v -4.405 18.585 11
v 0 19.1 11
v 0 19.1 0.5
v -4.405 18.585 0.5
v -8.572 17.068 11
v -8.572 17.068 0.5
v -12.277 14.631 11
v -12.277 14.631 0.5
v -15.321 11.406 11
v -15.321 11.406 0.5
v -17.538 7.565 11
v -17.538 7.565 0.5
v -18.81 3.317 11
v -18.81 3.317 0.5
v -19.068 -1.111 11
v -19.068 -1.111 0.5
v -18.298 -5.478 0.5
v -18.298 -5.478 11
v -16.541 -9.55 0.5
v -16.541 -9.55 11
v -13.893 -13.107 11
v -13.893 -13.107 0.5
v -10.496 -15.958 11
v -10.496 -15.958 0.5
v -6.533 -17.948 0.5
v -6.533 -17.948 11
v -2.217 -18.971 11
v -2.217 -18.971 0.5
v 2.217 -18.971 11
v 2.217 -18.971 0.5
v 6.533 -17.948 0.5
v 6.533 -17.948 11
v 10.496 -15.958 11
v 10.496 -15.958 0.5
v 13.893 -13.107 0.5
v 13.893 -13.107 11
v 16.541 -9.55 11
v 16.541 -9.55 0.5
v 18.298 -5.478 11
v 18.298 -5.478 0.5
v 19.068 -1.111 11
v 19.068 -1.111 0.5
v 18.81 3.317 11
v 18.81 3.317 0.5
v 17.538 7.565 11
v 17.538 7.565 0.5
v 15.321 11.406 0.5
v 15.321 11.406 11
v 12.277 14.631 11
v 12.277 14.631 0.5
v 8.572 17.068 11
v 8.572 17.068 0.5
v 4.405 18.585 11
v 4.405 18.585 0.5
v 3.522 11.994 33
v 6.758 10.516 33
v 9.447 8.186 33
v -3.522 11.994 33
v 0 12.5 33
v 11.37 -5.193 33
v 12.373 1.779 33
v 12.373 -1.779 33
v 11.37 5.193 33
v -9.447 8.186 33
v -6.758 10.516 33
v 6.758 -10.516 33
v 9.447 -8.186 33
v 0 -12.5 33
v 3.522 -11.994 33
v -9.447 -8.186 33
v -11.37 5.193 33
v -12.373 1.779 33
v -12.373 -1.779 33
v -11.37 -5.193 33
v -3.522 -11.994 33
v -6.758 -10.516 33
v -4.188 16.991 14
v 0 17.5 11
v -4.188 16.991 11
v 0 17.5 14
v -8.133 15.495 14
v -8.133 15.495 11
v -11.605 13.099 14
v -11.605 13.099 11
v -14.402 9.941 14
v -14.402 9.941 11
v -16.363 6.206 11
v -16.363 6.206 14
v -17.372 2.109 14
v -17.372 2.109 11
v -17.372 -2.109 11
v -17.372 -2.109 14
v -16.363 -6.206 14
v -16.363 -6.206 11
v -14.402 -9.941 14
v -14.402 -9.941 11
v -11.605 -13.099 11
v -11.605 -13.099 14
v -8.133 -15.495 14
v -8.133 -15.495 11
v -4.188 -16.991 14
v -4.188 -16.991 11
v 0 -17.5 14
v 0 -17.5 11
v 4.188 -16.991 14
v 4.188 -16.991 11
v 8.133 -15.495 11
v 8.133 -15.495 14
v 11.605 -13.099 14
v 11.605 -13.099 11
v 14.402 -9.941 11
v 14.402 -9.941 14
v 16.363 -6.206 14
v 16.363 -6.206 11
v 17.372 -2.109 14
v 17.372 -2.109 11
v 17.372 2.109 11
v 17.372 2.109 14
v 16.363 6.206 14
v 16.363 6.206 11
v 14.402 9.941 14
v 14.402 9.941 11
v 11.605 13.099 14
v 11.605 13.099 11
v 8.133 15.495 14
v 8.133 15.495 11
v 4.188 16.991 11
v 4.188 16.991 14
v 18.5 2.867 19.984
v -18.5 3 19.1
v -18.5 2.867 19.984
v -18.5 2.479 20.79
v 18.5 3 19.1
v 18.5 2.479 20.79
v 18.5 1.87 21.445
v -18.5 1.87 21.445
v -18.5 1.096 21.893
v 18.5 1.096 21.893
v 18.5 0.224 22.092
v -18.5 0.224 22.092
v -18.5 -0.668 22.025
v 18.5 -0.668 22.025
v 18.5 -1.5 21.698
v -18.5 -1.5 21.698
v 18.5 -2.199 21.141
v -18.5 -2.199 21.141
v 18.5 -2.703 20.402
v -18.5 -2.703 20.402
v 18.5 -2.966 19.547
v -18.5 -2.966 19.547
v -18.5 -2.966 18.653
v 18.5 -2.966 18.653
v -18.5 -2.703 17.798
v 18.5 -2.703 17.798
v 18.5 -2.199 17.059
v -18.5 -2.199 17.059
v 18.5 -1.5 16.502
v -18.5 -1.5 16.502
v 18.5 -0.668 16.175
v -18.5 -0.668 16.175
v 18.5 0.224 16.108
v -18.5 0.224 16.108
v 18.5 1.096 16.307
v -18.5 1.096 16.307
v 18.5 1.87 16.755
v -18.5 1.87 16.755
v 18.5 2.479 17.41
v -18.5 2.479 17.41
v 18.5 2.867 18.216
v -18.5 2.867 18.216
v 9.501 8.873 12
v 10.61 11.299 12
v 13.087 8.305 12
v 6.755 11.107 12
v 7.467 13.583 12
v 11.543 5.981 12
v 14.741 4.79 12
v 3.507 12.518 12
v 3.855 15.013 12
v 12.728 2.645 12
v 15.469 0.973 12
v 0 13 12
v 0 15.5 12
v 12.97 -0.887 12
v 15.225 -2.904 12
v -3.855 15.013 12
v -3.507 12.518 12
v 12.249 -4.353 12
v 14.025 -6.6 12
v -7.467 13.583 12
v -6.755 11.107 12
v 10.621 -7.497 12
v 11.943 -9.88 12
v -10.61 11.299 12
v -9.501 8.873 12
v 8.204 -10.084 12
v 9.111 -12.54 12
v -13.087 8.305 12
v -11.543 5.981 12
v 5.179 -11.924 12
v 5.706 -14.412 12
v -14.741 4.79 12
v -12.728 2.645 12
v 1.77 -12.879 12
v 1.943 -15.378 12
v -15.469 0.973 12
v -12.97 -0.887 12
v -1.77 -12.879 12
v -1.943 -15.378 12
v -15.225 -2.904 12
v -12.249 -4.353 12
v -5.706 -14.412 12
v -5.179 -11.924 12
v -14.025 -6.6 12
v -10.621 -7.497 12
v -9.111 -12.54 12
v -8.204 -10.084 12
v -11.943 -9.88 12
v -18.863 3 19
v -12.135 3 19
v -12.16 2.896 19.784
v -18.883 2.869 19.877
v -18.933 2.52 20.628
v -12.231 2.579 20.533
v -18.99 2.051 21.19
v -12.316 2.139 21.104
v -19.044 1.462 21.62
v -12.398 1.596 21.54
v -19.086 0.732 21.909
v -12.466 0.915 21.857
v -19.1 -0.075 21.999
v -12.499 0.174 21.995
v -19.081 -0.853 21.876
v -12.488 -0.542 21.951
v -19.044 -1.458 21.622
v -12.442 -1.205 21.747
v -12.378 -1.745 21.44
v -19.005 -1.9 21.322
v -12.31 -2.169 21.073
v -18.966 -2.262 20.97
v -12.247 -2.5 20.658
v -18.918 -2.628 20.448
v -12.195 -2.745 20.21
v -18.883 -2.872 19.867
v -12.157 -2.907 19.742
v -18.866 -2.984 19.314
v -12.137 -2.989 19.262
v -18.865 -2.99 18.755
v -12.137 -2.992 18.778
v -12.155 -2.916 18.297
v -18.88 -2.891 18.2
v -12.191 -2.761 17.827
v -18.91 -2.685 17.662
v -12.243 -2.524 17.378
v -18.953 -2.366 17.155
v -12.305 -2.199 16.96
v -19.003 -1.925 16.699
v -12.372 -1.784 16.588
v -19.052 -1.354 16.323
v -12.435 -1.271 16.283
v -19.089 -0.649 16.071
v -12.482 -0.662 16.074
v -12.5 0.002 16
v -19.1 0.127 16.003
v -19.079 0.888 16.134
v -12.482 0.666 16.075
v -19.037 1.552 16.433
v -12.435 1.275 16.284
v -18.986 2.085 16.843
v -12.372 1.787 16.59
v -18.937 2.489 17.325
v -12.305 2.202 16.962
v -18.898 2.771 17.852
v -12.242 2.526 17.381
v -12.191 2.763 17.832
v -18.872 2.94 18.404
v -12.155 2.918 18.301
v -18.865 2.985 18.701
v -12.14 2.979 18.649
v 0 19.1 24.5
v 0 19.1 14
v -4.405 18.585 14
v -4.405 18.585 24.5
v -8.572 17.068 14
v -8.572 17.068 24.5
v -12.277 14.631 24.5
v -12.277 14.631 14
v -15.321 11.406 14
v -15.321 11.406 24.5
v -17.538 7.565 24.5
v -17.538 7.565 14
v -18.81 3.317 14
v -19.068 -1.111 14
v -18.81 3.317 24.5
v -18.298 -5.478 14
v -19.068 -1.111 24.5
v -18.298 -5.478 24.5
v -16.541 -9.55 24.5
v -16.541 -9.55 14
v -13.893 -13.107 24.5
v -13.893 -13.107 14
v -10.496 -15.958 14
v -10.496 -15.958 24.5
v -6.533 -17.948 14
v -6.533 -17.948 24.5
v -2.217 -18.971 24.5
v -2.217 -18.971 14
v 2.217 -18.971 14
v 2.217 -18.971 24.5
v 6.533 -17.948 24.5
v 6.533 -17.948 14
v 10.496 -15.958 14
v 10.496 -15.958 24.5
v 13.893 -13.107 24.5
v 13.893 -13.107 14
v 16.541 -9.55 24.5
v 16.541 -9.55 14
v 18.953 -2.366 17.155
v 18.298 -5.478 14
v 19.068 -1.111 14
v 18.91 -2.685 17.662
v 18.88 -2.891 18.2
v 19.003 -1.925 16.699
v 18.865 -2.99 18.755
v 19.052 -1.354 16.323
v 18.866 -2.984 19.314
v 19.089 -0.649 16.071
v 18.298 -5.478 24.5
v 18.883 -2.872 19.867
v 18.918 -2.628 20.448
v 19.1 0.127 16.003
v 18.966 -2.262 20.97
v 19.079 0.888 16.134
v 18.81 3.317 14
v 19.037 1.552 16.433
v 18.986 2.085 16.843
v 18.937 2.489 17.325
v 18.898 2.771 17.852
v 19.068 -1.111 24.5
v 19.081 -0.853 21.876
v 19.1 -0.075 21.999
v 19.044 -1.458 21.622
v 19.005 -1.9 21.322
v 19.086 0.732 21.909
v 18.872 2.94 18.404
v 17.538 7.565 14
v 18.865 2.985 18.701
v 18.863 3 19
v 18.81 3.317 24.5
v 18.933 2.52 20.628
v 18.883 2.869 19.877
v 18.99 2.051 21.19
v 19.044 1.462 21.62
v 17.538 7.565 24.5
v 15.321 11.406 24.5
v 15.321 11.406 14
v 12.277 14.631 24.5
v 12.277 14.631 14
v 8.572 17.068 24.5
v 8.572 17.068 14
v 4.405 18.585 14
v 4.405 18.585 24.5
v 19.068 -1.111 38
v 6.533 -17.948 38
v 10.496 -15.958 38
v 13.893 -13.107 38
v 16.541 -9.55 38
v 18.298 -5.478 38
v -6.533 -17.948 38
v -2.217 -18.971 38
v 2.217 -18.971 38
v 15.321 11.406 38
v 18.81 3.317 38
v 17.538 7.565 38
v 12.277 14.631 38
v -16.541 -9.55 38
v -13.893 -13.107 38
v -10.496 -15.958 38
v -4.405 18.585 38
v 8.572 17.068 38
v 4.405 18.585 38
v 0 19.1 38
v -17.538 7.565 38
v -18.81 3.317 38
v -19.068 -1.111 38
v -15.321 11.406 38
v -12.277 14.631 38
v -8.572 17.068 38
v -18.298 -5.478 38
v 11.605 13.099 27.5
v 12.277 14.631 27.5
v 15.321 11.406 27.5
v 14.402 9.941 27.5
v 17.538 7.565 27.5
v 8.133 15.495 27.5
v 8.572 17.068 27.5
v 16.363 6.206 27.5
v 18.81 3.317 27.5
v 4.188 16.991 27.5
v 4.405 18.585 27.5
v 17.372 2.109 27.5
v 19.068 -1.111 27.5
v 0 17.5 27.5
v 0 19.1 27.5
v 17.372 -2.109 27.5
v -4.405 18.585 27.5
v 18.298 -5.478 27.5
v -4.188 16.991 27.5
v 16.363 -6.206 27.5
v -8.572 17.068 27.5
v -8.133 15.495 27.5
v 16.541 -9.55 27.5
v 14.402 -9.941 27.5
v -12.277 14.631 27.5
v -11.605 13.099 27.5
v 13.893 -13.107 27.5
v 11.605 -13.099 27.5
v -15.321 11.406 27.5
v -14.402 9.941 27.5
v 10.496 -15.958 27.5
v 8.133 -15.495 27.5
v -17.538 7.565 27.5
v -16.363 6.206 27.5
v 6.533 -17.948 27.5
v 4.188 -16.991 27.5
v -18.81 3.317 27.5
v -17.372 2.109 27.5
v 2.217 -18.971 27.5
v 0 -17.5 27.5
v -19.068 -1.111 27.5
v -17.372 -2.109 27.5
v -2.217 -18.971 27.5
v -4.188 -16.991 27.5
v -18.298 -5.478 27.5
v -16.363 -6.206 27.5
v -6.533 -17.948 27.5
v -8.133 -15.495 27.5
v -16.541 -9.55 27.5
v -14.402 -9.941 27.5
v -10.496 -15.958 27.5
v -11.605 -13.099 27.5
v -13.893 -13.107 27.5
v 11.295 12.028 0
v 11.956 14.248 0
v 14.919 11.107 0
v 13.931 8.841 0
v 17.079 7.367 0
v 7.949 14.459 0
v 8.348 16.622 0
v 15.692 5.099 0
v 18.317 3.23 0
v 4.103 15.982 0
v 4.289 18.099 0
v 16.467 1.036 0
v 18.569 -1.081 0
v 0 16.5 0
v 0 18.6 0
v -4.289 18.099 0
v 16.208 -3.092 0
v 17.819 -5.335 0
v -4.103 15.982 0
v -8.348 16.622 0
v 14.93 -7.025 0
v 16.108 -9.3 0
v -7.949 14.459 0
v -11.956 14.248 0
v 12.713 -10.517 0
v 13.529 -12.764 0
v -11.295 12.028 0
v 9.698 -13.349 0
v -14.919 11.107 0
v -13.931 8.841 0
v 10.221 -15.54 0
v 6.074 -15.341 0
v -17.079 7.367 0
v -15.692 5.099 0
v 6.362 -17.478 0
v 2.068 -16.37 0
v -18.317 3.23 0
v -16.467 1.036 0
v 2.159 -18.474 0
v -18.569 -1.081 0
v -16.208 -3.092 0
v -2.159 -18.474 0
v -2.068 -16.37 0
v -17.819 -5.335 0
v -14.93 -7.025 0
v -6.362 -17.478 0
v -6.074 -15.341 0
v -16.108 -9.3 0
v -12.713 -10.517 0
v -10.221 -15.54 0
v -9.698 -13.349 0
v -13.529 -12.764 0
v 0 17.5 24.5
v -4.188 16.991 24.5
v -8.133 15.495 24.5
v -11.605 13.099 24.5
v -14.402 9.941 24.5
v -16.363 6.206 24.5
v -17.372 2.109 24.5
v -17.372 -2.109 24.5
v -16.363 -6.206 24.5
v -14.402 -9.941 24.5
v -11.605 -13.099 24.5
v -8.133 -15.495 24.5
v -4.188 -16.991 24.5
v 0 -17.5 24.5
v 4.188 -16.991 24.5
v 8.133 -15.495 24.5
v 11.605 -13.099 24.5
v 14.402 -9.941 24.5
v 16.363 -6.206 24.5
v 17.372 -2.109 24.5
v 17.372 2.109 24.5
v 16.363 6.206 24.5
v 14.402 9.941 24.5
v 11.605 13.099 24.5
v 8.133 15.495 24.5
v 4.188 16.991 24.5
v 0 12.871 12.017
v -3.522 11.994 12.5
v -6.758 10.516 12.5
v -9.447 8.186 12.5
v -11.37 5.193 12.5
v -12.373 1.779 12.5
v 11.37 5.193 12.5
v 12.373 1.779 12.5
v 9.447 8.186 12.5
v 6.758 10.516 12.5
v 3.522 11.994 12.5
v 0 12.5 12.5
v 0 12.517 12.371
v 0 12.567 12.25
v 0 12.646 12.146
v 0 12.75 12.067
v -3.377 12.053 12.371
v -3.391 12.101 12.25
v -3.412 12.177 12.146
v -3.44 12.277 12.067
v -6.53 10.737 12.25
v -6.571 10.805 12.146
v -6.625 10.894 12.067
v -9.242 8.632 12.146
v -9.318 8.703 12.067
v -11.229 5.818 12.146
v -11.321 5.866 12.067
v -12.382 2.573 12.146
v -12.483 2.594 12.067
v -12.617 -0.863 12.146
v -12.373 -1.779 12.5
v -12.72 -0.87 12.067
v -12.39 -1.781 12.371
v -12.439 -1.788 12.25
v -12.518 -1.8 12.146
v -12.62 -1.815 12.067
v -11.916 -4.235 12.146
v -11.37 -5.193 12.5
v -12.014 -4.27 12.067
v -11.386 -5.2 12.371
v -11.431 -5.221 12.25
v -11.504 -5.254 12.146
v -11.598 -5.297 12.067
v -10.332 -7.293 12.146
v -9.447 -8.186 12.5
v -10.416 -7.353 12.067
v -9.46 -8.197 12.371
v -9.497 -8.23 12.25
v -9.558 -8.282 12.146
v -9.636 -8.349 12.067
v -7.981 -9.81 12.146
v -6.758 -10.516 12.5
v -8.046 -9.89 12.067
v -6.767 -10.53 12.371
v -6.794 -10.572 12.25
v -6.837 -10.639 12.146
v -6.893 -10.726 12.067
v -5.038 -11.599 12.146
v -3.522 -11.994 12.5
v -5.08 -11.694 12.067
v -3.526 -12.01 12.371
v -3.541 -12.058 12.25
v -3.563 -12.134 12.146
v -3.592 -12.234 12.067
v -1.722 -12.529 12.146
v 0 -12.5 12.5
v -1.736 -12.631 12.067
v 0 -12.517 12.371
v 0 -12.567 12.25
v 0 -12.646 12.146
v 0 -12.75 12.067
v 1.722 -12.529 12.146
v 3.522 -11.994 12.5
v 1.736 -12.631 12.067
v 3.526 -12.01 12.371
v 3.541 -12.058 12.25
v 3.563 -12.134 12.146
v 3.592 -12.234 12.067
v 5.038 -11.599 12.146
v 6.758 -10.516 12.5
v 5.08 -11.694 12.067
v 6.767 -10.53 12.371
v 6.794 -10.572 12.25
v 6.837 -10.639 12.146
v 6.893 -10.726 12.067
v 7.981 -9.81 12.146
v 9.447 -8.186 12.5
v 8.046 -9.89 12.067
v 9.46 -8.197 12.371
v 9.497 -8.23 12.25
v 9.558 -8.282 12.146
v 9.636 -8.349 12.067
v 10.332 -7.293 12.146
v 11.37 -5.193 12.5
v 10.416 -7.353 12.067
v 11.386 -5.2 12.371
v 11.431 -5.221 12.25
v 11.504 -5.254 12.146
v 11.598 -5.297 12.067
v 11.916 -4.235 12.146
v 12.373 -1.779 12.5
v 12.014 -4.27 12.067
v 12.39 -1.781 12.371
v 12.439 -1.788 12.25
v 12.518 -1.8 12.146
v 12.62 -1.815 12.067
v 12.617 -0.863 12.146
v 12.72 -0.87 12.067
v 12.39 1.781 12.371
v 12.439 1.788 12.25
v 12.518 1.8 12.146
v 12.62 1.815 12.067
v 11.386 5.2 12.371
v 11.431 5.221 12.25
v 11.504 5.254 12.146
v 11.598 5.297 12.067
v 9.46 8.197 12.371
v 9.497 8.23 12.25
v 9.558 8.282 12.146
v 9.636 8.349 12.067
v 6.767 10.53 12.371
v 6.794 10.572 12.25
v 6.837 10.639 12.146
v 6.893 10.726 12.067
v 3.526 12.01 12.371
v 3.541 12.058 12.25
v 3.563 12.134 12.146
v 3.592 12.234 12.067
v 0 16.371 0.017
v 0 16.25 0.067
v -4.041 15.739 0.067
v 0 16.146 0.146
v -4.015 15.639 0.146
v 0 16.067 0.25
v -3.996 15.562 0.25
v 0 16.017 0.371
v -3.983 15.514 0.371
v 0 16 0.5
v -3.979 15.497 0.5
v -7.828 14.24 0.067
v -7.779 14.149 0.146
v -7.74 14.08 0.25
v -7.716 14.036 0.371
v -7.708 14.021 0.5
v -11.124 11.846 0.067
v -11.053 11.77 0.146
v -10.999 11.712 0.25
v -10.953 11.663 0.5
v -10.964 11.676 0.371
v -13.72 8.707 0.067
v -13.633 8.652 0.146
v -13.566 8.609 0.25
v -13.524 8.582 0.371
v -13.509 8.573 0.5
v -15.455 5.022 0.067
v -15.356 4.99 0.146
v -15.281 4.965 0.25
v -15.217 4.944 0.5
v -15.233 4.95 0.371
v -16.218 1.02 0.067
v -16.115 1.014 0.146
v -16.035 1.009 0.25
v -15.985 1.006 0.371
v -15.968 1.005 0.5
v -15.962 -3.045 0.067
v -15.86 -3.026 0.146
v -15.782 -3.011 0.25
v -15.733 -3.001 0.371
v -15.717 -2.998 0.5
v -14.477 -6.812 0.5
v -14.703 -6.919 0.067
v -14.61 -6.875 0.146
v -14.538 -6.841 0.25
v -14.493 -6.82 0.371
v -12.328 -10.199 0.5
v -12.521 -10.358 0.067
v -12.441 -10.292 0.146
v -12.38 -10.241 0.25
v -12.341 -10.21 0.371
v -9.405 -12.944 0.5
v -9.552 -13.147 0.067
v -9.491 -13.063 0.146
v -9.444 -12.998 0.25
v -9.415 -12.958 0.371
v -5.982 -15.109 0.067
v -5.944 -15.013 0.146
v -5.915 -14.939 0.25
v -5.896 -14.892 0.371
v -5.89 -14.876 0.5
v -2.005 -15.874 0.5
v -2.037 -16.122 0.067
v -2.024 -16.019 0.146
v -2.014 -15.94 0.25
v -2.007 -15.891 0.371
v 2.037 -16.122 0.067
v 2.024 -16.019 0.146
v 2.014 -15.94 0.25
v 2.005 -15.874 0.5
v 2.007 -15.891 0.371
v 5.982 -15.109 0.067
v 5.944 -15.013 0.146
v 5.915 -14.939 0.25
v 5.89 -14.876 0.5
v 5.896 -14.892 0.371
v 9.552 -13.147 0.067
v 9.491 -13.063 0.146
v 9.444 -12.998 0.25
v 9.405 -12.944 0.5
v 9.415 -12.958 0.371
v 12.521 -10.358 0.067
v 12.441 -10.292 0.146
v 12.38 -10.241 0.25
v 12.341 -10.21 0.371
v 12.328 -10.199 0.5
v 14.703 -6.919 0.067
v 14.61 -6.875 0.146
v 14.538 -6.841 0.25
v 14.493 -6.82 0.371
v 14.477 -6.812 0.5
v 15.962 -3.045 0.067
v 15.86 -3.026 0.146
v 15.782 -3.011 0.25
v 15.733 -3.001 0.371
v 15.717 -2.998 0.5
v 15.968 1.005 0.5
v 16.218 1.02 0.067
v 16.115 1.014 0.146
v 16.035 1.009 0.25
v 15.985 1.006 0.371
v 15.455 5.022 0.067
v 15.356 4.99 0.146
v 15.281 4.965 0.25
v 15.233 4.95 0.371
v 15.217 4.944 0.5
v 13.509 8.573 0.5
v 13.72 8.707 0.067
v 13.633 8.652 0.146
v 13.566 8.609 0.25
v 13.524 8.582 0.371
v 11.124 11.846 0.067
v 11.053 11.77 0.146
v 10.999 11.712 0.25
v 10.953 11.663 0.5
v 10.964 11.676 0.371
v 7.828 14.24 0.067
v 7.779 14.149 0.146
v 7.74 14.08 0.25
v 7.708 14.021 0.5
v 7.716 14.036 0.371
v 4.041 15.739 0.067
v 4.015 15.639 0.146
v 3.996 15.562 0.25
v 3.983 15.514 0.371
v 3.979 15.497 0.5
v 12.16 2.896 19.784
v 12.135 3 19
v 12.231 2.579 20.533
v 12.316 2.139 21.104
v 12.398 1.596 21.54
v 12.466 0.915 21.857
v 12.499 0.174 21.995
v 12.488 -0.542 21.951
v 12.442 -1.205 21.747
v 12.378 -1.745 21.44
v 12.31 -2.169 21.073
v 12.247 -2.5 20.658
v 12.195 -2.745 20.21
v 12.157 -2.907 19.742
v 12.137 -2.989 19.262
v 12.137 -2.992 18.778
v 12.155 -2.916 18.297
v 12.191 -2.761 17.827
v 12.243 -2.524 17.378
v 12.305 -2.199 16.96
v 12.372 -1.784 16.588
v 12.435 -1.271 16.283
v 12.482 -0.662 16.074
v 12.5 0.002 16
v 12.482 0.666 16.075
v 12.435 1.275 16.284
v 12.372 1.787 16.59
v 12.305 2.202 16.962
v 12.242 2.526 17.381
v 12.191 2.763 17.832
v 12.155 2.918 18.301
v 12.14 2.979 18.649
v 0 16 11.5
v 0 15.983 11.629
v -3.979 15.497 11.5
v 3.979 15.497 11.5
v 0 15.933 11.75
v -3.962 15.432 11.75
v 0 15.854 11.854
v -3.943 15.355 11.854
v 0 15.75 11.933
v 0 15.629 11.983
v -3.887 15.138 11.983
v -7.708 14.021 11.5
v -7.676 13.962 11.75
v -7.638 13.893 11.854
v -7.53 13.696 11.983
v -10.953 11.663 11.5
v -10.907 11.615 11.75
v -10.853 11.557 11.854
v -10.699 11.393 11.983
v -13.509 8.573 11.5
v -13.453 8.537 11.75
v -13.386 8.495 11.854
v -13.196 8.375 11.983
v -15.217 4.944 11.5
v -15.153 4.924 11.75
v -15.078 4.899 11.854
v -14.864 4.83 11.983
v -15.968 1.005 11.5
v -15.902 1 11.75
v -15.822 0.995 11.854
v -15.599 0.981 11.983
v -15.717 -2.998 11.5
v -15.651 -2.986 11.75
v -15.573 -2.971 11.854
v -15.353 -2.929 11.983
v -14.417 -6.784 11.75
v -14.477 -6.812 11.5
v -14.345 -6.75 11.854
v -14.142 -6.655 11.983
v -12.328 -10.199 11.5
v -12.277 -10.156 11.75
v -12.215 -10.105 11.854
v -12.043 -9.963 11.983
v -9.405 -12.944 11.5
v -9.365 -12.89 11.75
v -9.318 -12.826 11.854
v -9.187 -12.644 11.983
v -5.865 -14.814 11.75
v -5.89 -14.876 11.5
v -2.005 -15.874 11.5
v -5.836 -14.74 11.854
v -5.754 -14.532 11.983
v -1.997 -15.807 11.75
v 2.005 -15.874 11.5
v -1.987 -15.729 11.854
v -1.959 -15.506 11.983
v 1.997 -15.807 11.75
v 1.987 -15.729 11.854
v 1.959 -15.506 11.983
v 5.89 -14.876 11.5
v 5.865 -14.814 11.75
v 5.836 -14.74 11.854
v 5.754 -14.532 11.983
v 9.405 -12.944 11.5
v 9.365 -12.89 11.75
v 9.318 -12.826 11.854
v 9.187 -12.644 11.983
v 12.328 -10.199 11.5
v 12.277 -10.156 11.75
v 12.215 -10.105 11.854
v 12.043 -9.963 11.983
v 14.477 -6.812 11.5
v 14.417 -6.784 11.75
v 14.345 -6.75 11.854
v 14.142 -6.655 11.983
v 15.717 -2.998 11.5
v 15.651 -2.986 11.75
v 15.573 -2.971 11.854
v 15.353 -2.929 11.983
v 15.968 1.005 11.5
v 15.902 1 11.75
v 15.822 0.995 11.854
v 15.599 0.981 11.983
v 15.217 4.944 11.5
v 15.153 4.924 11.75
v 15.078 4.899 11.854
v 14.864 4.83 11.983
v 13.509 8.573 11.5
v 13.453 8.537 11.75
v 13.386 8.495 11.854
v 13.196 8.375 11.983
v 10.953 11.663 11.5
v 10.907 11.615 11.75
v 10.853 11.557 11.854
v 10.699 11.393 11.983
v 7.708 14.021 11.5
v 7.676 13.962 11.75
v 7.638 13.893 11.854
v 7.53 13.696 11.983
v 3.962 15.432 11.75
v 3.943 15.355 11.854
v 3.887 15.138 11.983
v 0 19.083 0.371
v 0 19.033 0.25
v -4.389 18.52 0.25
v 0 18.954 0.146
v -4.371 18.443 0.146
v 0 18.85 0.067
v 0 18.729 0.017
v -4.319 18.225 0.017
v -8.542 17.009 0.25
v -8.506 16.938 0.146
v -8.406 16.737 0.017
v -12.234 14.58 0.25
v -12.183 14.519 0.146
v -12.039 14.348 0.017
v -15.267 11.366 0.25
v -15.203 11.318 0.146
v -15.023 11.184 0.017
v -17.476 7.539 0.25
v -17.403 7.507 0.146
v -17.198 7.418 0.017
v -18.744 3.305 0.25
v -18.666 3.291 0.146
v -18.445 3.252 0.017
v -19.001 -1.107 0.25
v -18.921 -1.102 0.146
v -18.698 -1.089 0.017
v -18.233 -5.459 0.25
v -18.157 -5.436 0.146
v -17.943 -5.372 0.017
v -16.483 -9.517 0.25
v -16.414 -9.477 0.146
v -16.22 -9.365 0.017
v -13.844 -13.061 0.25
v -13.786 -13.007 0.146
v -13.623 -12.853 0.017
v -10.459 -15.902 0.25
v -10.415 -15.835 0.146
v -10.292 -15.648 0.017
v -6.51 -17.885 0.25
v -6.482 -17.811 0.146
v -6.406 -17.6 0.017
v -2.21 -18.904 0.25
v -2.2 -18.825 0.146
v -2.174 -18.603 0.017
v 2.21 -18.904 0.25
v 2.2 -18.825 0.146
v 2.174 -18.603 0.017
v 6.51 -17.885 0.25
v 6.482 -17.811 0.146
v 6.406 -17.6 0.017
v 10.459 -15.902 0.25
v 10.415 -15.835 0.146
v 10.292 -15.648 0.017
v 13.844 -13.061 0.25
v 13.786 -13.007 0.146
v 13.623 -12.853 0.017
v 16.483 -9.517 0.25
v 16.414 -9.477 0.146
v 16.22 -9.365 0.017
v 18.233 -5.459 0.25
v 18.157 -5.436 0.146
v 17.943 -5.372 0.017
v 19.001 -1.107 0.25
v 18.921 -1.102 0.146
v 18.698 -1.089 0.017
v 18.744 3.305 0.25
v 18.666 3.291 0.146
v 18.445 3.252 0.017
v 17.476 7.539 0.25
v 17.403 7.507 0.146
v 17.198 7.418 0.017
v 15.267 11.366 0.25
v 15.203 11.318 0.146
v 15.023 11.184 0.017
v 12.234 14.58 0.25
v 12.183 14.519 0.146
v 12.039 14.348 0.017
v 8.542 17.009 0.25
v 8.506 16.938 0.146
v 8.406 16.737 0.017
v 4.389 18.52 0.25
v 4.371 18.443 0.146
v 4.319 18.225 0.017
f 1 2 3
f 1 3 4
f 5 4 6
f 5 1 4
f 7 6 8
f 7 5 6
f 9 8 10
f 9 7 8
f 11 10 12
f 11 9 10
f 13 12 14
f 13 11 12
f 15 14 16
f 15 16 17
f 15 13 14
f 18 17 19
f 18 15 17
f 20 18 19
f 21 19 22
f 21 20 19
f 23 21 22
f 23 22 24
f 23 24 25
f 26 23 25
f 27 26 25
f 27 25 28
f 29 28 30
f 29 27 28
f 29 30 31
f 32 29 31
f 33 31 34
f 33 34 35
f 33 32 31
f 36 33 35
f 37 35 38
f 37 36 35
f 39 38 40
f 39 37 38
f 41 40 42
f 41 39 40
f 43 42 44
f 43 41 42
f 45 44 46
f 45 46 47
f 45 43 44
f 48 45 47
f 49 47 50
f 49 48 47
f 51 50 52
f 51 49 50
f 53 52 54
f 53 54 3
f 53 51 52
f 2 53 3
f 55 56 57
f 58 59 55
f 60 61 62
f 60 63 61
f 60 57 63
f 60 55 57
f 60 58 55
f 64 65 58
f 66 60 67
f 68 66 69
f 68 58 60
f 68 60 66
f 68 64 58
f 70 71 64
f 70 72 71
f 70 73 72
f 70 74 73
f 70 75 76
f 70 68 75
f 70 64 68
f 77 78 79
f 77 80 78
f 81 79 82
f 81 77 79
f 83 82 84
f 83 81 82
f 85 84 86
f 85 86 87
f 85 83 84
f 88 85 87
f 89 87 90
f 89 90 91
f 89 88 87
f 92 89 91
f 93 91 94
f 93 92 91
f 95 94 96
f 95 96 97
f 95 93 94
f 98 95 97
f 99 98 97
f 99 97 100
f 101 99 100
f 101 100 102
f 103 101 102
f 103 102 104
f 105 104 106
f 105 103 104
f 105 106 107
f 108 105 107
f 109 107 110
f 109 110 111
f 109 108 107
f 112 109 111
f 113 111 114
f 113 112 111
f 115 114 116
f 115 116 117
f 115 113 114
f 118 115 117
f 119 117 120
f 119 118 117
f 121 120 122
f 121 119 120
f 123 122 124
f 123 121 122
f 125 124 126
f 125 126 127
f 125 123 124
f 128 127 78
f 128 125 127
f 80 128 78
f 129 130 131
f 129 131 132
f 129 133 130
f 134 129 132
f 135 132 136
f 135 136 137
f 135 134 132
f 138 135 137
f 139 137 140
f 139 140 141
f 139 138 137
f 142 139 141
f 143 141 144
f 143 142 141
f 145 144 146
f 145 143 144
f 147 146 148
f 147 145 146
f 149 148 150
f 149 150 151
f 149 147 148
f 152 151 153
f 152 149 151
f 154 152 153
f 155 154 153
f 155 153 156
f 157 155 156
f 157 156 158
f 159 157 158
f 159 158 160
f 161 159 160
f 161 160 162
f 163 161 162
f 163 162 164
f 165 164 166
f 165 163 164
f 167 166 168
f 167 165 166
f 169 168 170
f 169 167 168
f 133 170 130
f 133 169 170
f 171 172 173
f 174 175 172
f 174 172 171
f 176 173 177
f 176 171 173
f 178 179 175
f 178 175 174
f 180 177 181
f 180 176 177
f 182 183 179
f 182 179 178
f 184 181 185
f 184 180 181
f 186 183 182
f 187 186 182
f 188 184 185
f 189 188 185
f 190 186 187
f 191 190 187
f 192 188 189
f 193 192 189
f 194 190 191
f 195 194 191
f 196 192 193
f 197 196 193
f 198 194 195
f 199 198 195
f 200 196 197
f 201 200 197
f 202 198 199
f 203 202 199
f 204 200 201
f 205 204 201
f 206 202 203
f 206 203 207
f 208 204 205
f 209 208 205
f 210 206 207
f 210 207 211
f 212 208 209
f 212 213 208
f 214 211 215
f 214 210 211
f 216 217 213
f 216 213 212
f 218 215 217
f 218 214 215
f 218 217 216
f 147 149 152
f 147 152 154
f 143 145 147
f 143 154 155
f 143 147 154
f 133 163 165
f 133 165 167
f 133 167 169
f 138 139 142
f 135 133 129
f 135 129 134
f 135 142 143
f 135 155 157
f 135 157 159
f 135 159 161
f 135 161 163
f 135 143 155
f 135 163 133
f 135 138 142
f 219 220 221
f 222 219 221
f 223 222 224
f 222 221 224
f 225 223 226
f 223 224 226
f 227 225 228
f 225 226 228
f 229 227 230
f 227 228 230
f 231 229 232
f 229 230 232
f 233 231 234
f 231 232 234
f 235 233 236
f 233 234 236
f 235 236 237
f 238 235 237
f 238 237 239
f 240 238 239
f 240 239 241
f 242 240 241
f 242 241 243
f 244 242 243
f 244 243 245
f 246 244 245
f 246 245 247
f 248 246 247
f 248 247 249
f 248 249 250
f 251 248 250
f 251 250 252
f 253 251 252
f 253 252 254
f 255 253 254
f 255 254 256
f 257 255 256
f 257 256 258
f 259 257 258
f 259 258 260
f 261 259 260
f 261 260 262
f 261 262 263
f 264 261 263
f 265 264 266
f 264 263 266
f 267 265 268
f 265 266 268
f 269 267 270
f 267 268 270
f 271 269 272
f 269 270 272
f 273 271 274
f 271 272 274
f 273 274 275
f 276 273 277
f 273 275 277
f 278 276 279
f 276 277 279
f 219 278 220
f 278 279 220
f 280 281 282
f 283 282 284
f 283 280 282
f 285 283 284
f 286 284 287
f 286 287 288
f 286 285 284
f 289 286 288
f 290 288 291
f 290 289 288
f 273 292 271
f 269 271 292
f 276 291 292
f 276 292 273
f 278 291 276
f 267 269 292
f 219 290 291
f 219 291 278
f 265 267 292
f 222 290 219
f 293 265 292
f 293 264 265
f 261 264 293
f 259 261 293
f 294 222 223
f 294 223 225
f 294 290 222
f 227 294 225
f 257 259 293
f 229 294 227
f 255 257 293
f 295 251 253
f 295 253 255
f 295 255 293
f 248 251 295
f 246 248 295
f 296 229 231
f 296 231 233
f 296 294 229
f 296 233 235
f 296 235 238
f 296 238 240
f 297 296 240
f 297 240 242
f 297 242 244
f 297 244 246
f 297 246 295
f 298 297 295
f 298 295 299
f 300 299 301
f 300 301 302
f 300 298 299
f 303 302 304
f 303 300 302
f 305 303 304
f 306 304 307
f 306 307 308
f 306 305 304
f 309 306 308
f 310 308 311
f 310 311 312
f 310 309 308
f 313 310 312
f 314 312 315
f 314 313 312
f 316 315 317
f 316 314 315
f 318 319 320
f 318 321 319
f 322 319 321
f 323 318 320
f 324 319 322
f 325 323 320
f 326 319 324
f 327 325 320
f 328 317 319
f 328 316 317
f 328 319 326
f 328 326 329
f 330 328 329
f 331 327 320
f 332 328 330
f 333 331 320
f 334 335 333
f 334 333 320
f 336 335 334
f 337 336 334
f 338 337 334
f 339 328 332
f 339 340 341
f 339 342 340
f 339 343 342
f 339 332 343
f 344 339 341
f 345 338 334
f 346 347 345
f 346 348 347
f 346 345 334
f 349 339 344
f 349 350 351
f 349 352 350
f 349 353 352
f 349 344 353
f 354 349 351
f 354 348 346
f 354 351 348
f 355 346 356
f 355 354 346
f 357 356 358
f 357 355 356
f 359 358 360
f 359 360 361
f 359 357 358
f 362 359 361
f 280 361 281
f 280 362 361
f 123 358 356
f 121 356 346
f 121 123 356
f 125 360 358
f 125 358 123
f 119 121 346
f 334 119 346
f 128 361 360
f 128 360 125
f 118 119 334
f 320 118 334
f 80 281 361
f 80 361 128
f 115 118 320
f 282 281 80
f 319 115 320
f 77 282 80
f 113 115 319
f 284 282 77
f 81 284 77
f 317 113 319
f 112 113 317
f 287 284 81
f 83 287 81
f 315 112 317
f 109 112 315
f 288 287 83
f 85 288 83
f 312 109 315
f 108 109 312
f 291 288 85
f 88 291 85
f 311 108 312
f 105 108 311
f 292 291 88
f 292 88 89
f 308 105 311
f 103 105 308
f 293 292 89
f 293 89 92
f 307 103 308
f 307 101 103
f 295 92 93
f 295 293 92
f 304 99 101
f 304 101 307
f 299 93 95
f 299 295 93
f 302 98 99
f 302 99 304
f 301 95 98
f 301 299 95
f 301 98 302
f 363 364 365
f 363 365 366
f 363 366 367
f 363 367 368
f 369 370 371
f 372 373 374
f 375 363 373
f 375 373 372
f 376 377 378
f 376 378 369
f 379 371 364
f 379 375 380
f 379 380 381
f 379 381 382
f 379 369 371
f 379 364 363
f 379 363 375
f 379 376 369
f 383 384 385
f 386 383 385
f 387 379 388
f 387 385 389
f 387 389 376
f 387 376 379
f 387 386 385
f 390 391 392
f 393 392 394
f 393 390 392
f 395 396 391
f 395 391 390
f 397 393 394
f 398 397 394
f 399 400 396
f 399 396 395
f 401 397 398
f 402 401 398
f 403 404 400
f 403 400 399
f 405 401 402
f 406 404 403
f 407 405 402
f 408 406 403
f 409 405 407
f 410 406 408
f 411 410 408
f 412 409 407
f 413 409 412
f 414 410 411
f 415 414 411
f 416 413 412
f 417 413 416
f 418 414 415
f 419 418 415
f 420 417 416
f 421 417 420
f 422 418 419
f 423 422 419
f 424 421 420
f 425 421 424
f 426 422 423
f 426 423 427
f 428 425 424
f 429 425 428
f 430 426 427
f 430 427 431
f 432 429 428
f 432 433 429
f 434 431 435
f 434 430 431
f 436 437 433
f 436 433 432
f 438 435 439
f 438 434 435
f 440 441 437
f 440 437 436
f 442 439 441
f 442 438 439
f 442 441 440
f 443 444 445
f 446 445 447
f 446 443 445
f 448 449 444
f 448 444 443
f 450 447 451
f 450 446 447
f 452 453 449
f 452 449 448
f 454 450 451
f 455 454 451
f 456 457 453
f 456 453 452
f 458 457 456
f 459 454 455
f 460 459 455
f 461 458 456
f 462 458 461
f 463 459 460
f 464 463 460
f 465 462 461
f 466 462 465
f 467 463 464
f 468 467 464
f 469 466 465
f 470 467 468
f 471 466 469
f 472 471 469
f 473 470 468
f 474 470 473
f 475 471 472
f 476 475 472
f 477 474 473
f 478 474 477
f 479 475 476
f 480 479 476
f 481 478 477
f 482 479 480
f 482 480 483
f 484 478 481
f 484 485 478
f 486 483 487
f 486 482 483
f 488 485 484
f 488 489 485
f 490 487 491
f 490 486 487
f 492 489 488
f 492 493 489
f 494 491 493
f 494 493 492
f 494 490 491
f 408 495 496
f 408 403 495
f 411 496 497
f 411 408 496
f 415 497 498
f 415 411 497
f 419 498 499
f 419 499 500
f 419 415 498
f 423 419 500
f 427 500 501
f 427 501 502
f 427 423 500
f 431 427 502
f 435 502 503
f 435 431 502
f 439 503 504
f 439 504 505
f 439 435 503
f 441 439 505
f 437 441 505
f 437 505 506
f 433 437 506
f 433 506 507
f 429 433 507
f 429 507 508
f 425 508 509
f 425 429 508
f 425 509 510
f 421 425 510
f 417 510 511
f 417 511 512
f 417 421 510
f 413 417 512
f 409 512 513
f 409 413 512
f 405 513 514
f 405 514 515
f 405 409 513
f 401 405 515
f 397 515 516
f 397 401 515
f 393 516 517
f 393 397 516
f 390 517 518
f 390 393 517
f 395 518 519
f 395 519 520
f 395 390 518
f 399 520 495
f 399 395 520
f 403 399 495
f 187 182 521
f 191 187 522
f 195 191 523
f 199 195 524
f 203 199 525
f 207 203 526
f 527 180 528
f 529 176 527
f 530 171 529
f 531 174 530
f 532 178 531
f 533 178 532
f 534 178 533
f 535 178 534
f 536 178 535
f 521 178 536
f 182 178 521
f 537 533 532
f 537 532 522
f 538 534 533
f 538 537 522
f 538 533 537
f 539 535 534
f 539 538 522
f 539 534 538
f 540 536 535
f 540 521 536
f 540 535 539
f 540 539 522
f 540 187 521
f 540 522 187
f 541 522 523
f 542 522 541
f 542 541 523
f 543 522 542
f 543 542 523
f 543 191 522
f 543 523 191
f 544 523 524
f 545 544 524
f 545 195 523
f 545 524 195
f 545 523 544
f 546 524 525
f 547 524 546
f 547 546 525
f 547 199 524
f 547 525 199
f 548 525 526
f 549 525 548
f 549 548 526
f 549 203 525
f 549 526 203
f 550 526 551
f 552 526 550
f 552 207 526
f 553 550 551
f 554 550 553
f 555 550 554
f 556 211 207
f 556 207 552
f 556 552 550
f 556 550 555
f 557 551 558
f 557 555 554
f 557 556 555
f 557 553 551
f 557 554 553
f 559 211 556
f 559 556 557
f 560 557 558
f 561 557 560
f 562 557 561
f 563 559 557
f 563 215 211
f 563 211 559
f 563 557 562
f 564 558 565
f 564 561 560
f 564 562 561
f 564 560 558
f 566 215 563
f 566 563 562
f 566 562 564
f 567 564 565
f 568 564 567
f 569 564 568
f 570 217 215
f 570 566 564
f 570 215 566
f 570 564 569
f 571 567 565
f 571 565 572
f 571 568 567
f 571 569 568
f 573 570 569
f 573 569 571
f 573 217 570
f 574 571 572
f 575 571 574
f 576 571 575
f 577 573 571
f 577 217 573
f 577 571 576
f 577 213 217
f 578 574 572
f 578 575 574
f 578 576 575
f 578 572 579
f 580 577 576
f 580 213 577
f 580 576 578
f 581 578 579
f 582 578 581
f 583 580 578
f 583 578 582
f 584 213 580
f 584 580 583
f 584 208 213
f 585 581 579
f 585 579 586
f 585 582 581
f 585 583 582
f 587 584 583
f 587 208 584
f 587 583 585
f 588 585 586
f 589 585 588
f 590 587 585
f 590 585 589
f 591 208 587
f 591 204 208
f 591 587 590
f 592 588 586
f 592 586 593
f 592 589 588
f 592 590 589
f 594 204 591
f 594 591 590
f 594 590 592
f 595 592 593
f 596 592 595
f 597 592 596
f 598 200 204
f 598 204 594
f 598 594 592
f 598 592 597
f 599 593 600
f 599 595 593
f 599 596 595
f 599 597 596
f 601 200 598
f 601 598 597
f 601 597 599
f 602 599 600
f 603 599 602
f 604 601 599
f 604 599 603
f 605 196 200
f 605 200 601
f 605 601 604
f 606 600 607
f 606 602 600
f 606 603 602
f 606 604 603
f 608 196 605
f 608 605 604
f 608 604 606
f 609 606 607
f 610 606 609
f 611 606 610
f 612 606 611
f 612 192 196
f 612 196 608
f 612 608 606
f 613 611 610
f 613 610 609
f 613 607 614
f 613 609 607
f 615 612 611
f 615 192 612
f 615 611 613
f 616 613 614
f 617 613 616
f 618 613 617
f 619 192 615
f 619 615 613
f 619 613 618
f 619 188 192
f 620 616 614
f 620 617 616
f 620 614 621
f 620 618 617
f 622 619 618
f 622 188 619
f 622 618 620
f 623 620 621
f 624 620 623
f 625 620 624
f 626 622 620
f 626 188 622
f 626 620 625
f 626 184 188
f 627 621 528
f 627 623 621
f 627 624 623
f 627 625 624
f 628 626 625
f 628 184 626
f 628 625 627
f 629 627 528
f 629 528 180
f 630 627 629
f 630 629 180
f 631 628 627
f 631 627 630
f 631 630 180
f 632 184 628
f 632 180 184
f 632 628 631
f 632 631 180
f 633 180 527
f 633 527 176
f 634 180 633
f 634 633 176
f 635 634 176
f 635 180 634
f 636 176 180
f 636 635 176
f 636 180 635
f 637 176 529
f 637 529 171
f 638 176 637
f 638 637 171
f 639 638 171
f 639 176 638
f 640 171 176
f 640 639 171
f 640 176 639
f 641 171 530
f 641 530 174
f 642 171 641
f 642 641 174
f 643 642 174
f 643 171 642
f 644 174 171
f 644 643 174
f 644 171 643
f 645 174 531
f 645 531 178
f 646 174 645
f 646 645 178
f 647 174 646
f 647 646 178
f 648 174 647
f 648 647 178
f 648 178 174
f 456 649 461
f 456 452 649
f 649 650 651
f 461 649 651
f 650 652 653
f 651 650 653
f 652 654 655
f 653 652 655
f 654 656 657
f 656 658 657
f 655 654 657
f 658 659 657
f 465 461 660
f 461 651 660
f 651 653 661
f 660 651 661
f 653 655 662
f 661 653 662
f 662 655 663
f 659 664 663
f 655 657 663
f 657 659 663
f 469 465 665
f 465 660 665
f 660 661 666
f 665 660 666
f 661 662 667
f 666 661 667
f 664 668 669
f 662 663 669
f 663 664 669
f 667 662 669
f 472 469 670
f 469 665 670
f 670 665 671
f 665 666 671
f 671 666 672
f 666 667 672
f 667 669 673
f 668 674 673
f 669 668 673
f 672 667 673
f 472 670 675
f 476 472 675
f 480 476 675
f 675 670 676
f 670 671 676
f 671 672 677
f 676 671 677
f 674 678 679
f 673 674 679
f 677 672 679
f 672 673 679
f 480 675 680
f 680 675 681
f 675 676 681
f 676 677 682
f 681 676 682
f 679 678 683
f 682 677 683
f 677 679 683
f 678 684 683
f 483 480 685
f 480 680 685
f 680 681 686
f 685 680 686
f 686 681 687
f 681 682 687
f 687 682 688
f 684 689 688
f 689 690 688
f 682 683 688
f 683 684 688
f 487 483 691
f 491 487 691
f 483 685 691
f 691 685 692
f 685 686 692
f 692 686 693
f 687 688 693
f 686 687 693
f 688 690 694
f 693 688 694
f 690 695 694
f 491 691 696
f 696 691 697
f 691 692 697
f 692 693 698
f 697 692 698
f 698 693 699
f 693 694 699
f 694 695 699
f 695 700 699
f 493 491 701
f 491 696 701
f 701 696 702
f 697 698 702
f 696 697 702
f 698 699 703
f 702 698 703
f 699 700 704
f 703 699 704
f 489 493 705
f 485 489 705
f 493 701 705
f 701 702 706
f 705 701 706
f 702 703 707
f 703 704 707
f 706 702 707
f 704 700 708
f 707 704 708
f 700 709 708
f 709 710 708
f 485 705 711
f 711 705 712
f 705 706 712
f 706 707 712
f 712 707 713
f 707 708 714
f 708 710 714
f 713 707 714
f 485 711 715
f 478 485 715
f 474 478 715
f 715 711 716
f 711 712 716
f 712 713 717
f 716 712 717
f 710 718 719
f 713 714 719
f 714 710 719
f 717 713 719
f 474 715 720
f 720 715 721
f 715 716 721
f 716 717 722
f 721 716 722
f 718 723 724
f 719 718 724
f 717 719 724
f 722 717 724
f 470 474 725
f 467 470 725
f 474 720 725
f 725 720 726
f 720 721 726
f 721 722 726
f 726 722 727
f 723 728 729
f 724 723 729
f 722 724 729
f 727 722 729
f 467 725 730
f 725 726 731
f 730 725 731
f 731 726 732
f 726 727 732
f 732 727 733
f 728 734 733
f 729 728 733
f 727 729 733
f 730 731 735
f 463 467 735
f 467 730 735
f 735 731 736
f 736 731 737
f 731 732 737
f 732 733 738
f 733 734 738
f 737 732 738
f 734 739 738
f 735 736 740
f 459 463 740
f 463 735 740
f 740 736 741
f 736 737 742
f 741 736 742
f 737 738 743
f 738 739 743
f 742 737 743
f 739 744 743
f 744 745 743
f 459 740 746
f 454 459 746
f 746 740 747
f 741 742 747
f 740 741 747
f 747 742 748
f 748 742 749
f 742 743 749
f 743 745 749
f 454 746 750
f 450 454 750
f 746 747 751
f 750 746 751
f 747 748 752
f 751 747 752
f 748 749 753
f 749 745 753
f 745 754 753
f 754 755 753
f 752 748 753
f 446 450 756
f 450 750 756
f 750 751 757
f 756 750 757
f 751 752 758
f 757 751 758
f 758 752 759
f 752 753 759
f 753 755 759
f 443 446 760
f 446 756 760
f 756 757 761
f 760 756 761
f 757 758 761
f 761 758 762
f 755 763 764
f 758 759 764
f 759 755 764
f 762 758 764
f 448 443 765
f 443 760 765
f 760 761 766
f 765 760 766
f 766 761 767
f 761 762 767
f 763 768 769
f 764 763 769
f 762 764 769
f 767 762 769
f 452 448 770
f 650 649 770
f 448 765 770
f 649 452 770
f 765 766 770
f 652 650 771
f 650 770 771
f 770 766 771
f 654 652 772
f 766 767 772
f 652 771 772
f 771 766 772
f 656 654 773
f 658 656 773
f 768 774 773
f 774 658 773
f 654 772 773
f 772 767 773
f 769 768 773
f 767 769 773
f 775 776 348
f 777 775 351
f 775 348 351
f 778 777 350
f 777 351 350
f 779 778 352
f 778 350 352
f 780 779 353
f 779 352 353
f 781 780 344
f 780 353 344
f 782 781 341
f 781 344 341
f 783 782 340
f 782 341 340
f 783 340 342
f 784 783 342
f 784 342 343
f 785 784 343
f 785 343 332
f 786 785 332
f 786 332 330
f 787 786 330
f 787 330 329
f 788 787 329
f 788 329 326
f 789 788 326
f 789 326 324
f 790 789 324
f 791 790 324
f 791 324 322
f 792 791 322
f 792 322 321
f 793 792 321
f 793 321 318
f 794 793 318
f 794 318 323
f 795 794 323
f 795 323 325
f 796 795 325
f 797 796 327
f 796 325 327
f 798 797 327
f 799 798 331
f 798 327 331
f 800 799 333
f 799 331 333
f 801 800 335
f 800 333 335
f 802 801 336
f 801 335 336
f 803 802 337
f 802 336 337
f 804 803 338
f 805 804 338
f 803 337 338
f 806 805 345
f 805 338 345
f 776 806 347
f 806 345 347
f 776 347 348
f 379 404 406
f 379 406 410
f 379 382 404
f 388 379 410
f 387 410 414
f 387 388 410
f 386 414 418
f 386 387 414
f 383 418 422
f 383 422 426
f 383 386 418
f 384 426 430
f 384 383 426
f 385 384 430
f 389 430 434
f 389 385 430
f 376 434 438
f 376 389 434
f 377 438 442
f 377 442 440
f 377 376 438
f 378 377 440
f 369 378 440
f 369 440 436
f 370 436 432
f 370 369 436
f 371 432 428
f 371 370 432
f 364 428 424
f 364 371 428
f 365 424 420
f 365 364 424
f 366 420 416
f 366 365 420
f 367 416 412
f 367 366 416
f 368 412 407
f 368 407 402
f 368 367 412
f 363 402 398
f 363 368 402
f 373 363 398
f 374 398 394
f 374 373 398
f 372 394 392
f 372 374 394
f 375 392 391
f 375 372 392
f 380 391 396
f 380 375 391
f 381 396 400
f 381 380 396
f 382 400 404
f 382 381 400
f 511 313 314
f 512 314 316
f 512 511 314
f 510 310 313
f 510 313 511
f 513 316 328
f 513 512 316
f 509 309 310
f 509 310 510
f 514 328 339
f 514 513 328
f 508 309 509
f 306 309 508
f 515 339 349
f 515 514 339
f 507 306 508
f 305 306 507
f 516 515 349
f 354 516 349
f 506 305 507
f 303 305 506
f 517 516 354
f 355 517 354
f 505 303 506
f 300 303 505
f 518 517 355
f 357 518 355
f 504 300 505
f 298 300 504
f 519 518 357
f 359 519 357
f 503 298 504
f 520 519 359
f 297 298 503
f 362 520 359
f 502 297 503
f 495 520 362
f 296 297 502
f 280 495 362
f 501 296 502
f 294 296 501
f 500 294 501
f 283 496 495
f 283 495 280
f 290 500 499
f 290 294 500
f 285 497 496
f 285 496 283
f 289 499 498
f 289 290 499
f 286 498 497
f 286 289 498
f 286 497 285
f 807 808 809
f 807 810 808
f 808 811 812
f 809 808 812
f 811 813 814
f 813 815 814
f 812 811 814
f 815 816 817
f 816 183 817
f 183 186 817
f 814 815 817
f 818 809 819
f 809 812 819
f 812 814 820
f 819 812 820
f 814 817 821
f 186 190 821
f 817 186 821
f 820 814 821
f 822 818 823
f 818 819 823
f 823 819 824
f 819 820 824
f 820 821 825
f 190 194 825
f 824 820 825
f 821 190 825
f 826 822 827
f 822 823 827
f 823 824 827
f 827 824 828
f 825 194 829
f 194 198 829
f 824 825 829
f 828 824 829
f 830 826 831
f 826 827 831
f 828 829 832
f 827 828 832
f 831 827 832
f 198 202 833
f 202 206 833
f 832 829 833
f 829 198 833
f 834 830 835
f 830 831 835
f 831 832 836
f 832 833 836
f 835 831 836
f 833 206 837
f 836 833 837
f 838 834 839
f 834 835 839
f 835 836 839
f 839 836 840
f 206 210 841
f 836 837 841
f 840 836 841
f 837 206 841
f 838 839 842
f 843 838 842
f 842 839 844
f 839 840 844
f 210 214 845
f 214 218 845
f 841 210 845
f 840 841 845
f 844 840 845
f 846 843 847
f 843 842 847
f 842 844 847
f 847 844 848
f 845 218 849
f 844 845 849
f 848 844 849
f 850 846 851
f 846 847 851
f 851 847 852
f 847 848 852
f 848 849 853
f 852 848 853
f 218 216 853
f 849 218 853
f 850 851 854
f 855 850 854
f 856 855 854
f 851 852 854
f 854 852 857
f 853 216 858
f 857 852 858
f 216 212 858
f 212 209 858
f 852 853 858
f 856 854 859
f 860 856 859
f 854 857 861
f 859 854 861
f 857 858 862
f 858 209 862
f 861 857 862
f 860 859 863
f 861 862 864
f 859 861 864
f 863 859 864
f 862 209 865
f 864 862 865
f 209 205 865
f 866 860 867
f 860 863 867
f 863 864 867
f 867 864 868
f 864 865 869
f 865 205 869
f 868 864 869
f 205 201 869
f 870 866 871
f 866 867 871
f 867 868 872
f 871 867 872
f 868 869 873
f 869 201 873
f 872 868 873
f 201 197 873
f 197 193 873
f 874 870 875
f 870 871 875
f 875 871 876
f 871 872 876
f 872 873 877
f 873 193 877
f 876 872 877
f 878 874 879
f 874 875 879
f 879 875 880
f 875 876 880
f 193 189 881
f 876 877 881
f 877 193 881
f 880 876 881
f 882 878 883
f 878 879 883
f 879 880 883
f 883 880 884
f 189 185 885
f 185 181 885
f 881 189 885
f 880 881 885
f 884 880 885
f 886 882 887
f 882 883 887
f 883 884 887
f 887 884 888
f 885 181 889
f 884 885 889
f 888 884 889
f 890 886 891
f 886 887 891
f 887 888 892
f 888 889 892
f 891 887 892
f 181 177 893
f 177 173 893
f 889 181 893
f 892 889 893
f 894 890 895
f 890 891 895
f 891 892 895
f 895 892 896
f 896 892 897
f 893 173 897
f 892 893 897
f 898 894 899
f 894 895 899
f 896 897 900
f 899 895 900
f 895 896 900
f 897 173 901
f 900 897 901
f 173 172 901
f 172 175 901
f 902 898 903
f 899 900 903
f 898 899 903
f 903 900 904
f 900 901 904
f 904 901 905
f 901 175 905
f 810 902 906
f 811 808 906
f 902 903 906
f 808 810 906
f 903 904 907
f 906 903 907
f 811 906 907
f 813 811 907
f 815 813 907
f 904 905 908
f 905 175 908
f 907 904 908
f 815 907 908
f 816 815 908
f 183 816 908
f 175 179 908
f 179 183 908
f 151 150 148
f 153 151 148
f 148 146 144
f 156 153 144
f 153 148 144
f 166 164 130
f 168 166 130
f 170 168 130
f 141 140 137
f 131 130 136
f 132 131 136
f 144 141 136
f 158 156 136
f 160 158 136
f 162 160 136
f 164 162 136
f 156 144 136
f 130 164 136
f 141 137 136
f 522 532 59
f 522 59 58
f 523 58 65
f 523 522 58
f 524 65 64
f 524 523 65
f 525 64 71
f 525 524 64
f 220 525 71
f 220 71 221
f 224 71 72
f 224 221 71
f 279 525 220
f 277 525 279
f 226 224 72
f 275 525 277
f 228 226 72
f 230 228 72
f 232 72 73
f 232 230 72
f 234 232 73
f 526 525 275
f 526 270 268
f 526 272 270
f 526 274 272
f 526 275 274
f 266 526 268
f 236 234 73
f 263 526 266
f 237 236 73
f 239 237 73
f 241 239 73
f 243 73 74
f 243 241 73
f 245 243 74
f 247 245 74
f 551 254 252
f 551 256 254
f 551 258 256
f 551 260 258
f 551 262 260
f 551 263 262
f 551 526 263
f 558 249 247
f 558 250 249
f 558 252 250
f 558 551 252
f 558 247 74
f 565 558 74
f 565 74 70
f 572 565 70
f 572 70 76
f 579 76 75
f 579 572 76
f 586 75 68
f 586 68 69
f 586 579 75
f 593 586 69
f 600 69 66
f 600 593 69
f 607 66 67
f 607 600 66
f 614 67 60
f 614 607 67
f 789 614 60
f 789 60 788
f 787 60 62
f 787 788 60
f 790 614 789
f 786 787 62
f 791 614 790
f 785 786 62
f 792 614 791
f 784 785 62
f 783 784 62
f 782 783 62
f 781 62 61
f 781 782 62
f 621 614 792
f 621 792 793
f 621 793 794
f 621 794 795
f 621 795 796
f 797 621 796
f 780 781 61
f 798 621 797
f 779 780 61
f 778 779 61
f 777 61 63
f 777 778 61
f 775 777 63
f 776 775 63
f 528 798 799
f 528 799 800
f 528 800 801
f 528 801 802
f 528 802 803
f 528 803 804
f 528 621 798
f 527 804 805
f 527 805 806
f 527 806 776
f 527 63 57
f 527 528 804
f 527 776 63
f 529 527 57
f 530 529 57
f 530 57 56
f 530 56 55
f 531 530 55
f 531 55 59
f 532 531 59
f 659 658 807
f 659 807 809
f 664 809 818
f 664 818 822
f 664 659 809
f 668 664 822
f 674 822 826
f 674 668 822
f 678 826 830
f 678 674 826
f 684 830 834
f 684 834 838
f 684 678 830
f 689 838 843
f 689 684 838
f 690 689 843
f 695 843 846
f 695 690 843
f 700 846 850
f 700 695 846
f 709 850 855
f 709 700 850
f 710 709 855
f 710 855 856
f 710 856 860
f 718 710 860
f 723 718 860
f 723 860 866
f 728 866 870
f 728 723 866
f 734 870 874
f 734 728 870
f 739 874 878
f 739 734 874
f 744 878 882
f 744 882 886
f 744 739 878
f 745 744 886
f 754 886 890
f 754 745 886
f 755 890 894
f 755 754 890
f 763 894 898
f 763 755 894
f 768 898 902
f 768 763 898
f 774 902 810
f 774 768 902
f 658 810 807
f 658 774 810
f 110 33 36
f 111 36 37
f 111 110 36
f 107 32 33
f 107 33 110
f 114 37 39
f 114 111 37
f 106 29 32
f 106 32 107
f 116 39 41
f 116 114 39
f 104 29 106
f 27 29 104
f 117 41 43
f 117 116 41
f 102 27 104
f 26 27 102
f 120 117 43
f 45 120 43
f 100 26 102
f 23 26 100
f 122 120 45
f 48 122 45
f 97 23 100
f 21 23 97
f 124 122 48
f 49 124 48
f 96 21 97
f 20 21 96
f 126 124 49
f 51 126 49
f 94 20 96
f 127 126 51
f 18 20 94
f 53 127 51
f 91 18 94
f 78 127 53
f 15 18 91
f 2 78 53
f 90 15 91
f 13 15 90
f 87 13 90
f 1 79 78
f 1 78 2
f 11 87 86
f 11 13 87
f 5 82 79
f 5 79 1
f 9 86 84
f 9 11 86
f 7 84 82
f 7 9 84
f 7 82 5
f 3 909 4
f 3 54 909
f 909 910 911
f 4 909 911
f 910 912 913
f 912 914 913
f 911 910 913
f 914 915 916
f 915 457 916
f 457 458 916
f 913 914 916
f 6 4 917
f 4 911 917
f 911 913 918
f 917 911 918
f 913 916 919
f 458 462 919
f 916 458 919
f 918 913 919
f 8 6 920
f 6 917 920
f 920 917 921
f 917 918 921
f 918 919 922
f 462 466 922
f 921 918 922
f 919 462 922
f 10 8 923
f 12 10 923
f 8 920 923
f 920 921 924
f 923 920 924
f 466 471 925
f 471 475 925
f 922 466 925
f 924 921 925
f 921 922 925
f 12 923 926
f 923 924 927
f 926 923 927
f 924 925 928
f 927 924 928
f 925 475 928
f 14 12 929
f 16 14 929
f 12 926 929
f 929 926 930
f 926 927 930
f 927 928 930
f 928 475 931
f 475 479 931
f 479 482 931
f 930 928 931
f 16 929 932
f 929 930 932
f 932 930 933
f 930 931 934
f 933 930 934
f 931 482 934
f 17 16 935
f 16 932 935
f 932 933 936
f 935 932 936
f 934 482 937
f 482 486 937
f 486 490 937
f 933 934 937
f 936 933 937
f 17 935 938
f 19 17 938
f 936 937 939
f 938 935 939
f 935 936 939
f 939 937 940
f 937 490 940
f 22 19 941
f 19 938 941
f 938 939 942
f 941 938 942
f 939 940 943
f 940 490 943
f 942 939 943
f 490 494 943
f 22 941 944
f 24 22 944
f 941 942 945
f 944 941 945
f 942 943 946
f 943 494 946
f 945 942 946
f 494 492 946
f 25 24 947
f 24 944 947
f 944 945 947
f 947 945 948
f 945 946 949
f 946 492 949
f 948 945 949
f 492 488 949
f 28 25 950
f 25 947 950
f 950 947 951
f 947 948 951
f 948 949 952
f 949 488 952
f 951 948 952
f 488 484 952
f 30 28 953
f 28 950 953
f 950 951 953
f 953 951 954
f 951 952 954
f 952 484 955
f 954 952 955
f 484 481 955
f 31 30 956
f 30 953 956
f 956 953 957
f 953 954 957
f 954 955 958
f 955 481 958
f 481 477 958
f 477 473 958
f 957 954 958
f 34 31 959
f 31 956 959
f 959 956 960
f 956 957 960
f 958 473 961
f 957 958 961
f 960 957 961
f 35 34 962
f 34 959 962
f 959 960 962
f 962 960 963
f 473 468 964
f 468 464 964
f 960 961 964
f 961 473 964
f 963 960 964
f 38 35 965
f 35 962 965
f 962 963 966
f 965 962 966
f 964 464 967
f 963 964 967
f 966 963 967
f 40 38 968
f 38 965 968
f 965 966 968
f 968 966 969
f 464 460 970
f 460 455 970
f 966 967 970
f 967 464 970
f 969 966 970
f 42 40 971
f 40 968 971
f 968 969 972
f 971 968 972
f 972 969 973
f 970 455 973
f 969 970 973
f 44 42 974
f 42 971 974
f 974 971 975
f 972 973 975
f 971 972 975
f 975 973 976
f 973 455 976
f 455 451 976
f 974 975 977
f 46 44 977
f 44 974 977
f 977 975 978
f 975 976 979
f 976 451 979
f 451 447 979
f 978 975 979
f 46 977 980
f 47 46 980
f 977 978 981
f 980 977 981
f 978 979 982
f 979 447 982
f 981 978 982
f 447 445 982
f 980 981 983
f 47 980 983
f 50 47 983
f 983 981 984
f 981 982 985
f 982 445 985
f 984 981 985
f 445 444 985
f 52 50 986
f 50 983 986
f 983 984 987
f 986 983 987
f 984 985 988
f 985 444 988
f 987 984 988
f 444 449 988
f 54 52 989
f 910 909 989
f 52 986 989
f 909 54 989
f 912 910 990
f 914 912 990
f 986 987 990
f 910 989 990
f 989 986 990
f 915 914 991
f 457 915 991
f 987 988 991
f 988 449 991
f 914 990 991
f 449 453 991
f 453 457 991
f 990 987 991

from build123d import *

# Parameters (mm, degrees)
F3_R     = 3
F4_DEPTH = 38.201
F5_R     = 3
F6_DEPTH = 18.5
F7_R     = 0.5


with BuildPart() as f1:
    # F0 (on Right) → F1 (revolve)
    with BuildSketch(Plane.YZ):
        Polygon((0, 38), (0, 33), (12.5, 33), (12.5, 12), (16, 12), (16, 0), (19.1, 0), (19.1, 11), (17.5, 11), (17.5, 14), (19.1, 14), (19.1, 24.5), (17.5, 24.5), (17.5, 27.5), (19.1, 27.5), (19.1, 38), align=None)
    revolve(axis=Axis((0, 0, 35.5), (0, 0, 1)))

    # F3 (on offset) → F4 (cut, through all)
    with BuildSketch(Plane.YZ.offset(19.1)):
        with Locations((0, 19)):
            Circle(F3_R)
    extrude(amount=-F4_DEPTH, mode=Mode.SUBTRACT)

    # F7
    f7_edges = [f1.edges().sort_by_distance(p)[0] for p in [
        (0, -19.1, 0),
        (0, -16, 0),
        (0, -16, 12),
        (0, -12.5, 12),
    ]]
    fillet(f7_edges, radius=F7_R)


with BuildPart() as f6:
    # F5 (on Right) → F6 (new body, symmetric)
    with BuildSketch(Plane.YZ):
        with Locations((0, 19.1)):
            Circle(F5_R)
    extrude(amount=F6_DEPTH, both=True)


solid = Compound([f1.part, f6.part])
